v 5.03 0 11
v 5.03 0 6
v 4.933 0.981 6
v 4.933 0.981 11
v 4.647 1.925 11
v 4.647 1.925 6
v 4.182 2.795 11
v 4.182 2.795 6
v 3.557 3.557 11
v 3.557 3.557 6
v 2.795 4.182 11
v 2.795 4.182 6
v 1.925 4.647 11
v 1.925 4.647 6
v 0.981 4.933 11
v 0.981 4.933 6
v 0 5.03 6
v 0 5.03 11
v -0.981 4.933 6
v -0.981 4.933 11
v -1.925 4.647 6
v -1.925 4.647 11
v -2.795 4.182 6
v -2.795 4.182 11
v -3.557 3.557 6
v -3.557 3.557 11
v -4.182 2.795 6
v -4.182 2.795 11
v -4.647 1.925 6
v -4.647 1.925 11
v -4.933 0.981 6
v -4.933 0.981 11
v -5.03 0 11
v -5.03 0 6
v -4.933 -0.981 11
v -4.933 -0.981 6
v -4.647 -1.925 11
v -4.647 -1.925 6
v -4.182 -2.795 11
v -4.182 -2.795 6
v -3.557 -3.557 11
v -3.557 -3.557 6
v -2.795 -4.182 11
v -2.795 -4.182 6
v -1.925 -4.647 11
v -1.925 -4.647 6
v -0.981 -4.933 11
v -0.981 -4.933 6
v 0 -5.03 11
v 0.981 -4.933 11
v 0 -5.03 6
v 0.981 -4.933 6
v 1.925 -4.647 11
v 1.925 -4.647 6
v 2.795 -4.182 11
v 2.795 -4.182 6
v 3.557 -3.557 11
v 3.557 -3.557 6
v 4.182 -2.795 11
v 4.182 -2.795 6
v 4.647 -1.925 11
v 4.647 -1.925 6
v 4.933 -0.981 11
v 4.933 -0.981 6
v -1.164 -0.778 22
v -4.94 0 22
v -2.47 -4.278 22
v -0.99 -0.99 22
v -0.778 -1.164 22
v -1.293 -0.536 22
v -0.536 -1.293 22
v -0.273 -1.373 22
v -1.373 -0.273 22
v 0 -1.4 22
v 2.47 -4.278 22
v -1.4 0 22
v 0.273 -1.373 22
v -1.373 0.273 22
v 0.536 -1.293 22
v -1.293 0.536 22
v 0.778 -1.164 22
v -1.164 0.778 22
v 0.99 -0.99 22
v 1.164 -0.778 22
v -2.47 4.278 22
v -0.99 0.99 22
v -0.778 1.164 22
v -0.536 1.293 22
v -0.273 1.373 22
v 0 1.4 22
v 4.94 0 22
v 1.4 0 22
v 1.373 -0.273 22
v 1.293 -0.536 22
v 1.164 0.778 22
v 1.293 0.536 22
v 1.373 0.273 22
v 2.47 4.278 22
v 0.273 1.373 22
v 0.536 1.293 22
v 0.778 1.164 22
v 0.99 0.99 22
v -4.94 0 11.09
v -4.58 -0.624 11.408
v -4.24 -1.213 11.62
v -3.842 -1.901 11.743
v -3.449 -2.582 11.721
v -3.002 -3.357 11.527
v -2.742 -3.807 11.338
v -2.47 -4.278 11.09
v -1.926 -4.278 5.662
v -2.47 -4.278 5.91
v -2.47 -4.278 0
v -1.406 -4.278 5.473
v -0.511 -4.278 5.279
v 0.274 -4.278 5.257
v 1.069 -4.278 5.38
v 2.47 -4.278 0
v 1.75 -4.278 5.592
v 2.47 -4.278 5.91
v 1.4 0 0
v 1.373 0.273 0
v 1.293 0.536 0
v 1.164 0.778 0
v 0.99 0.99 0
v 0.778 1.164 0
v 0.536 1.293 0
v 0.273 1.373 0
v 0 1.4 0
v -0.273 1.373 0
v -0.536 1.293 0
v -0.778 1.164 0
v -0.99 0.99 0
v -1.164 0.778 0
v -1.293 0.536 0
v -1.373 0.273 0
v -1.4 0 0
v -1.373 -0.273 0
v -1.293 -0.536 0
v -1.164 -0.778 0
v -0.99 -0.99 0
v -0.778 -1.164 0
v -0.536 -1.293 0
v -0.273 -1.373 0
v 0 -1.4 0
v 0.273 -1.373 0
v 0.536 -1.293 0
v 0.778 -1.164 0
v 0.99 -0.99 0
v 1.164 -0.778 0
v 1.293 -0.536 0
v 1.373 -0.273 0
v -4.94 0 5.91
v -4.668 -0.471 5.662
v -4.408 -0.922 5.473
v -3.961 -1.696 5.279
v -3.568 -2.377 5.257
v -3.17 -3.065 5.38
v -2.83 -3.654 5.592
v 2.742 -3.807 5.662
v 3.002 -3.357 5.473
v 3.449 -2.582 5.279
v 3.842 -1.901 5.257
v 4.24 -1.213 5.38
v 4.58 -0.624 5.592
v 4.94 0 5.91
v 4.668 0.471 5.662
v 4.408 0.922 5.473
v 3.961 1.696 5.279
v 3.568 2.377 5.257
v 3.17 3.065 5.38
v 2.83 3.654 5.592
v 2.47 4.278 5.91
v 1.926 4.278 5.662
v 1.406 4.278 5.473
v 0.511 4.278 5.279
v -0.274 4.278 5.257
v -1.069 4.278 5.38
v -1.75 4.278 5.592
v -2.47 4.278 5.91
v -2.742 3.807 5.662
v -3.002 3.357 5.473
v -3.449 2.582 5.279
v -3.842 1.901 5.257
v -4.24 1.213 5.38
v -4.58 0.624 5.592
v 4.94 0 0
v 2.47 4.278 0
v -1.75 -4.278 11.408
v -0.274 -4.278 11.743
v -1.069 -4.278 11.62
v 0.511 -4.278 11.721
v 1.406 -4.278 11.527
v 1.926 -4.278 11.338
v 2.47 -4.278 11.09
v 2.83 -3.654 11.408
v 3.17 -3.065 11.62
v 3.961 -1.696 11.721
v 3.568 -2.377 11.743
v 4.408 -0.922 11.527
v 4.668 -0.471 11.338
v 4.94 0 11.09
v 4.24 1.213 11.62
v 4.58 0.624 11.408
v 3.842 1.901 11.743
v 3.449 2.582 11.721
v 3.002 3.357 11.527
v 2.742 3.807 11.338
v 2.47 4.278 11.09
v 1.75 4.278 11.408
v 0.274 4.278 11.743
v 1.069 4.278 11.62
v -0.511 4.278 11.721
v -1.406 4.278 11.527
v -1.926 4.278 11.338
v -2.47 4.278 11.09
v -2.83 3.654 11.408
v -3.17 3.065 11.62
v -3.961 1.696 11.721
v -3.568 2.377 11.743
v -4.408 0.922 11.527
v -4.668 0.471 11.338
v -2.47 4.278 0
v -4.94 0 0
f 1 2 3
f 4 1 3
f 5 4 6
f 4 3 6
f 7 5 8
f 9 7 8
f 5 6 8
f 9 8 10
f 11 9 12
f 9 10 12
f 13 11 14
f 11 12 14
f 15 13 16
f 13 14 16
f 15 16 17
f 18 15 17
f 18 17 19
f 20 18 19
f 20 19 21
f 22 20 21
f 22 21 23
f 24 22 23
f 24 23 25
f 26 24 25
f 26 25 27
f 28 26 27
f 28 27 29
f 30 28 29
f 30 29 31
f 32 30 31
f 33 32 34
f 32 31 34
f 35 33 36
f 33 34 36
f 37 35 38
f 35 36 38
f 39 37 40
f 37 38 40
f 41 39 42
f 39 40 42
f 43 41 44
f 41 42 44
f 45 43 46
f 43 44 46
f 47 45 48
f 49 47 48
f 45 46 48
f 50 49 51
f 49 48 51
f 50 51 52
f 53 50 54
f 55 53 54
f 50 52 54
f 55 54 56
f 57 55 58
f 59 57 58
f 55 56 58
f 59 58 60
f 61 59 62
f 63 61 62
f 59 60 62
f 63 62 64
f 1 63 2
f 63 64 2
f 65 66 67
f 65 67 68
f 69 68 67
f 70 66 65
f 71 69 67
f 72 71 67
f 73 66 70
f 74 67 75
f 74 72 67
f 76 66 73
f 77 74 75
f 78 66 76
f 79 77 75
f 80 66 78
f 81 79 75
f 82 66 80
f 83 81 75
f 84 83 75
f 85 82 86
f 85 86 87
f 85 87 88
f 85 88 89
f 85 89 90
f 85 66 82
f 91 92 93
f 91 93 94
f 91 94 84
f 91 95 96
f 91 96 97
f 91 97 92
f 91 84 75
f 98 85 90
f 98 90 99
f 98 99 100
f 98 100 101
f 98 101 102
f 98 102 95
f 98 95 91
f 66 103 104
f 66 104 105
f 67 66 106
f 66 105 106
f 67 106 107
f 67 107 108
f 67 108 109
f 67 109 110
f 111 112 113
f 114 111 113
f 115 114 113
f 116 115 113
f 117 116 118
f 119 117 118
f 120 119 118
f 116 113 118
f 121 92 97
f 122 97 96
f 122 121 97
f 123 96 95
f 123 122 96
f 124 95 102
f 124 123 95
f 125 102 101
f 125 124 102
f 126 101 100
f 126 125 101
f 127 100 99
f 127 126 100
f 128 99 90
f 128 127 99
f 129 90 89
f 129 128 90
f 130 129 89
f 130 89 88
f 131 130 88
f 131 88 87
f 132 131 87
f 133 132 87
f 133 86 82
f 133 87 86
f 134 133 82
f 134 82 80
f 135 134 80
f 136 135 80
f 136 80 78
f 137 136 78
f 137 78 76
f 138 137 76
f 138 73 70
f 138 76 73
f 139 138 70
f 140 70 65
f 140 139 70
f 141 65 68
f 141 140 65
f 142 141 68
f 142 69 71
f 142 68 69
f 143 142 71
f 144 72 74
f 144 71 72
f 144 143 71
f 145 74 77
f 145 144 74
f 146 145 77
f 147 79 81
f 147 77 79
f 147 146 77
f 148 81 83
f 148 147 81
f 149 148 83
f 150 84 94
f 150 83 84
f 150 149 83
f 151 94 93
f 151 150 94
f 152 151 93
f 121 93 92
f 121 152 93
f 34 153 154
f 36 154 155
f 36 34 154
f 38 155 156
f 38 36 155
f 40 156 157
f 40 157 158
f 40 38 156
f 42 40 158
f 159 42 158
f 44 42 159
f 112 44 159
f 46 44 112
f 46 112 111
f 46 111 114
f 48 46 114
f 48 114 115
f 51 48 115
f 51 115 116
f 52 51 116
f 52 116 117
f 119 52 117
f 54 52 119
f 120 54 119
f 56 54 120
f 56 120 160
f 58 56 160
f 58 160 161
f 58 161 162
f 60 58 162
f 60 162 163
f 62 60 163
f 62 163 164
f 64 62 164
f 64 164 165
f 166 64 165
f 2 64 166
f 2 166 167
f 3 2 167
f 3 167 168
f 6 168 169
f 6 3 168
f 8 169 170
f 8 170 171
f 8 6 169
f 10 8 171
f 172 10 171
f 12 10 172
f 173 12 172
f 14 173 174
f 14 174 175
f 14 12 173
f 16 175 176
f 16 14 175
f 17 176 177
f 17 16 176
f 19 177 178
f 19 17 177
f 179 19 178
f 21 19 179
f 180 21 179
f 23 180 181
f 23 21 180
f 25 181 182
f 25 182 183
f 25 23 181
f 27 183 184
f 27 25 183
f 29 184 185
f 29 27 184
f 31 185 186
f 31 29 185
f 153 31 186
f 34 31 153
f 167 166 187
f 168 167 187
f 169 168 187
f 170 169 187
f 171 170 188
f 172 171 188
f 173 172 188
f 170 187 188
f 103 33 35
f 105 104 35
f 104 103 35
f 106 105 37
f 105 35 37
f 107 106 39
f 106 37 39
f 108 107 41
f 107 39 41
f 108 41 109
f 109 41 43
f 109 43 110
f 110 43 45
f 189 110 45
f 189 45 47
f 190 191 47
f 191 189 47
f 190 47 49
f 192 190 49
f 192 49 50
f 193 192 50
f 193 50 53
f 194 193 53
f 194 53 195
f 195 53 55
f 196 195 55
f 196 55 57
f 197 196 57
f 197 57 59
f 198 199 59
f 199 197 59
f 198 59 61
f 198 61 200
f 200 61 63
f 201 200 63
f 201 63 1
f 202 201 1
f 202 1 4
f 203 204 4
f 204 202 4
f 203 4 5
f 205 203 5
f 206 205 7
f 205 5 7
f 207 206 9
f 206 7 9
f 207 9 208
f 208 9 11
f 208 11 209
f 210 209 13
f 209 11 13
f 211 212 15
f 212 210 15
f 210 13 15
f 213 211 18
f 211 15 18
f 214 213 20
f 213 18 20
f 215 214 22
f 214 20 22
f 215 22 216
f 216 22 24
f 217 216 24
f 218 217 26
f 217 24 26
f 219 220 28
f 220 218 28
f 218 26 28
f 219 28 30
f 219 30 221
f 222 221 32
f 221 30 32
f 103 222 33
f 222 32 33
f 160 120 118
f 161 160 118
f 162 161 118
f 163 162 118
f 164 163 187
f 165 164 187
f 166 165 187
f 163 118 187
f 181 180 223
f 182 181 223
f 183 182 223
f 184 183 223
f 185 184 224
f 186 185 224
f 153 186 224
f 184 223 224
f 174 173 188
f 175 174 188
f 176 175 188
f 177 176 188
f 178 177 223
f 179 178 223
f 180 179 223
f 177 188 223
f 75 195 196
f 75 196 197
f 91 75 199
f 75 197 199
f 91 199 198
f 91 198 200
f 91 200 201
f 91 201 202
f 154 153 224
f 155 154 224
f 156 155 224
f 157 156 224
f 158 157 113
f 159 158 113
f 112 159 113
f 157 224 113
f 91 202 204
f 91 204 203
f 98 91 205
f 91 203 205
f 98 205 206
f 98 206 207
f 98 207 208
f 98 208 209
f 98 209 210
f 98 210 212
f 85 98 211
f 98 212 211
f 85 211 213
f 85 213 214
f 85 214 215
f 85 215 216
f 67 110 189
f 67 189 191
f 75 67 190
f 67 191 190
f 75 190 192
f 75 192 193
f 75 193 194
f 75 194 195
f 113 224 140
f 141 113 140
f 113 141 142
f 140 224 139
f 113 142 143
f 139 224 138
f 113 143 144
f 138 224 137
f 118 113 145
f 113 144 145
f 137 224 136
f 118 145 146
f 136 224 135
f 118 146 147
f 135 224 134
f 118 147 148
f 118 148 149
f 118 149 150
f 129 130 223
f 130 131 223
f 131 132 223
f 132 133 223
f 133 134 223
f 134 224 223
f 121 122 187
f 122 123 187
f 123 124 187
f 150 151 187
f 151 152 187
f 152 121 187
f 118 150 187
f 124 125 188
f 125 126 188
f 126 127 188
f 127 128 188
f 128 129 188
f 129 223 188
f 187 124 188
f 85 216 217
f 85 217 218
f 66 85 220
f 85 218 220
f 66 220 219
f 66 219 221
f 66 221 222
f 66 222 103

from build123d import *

# Parameters (mm, degrees)
SKETCH024_R          = 5.03
PAD018_DEPTH         = 5
PAD019_DEPTH         = 22
SKETCH027_R          = 1.4
POCKET004_DEPTH      = 0.001
POCKET004_DEPTH_BACK = 22.001


with BuildPart() as part:
    # Sketch024 → Pad018 (new body)
    with BuildSketch(Plane.XY.offset(6)):
        Circle(SKETCH024_R)
    extrude(amount=PAD018_DEPTH)

    # Sketch025 → Pad019 (join)
    with BuildSketch(Plane.XY):
        Polygon((2.47, -4.278165), (4.94, 0), (2.47, 4.278165), (-2.47, 4.278165), (-4.94, 0), (-2.47, -4.278165), align=None)
    extrude(amount=PAD019_DEPTH)

    # Sketch026 → Revolution006 (revolve)
    with BuildSketch(Plane.XZ):
        Polygon((-5.03, 11), (-3.83, 11), (-3.83, 12.2), align=None)
        Polygon((-5.03, 6), (-3.83, 6), (-3.83, 4.8), align=None)
    revolve(axis=Axis((0, 0, 0), (0, 0, 1)))

    # Sketch027 → Pocket004 (cut, two sides)
    with BuildSketch(Plane.XY) as pocket004_sk:
        Circle(SKETCH027_R)
    extrude(amount=-POCKET004_DEPTH, mode=Mode.SUBTRACT)
    extrude(pocket004_sk.sketch, amount=POCKET004_DEPTH_BACK, mode=Mode.SUBTRACT)


solid = part.part
